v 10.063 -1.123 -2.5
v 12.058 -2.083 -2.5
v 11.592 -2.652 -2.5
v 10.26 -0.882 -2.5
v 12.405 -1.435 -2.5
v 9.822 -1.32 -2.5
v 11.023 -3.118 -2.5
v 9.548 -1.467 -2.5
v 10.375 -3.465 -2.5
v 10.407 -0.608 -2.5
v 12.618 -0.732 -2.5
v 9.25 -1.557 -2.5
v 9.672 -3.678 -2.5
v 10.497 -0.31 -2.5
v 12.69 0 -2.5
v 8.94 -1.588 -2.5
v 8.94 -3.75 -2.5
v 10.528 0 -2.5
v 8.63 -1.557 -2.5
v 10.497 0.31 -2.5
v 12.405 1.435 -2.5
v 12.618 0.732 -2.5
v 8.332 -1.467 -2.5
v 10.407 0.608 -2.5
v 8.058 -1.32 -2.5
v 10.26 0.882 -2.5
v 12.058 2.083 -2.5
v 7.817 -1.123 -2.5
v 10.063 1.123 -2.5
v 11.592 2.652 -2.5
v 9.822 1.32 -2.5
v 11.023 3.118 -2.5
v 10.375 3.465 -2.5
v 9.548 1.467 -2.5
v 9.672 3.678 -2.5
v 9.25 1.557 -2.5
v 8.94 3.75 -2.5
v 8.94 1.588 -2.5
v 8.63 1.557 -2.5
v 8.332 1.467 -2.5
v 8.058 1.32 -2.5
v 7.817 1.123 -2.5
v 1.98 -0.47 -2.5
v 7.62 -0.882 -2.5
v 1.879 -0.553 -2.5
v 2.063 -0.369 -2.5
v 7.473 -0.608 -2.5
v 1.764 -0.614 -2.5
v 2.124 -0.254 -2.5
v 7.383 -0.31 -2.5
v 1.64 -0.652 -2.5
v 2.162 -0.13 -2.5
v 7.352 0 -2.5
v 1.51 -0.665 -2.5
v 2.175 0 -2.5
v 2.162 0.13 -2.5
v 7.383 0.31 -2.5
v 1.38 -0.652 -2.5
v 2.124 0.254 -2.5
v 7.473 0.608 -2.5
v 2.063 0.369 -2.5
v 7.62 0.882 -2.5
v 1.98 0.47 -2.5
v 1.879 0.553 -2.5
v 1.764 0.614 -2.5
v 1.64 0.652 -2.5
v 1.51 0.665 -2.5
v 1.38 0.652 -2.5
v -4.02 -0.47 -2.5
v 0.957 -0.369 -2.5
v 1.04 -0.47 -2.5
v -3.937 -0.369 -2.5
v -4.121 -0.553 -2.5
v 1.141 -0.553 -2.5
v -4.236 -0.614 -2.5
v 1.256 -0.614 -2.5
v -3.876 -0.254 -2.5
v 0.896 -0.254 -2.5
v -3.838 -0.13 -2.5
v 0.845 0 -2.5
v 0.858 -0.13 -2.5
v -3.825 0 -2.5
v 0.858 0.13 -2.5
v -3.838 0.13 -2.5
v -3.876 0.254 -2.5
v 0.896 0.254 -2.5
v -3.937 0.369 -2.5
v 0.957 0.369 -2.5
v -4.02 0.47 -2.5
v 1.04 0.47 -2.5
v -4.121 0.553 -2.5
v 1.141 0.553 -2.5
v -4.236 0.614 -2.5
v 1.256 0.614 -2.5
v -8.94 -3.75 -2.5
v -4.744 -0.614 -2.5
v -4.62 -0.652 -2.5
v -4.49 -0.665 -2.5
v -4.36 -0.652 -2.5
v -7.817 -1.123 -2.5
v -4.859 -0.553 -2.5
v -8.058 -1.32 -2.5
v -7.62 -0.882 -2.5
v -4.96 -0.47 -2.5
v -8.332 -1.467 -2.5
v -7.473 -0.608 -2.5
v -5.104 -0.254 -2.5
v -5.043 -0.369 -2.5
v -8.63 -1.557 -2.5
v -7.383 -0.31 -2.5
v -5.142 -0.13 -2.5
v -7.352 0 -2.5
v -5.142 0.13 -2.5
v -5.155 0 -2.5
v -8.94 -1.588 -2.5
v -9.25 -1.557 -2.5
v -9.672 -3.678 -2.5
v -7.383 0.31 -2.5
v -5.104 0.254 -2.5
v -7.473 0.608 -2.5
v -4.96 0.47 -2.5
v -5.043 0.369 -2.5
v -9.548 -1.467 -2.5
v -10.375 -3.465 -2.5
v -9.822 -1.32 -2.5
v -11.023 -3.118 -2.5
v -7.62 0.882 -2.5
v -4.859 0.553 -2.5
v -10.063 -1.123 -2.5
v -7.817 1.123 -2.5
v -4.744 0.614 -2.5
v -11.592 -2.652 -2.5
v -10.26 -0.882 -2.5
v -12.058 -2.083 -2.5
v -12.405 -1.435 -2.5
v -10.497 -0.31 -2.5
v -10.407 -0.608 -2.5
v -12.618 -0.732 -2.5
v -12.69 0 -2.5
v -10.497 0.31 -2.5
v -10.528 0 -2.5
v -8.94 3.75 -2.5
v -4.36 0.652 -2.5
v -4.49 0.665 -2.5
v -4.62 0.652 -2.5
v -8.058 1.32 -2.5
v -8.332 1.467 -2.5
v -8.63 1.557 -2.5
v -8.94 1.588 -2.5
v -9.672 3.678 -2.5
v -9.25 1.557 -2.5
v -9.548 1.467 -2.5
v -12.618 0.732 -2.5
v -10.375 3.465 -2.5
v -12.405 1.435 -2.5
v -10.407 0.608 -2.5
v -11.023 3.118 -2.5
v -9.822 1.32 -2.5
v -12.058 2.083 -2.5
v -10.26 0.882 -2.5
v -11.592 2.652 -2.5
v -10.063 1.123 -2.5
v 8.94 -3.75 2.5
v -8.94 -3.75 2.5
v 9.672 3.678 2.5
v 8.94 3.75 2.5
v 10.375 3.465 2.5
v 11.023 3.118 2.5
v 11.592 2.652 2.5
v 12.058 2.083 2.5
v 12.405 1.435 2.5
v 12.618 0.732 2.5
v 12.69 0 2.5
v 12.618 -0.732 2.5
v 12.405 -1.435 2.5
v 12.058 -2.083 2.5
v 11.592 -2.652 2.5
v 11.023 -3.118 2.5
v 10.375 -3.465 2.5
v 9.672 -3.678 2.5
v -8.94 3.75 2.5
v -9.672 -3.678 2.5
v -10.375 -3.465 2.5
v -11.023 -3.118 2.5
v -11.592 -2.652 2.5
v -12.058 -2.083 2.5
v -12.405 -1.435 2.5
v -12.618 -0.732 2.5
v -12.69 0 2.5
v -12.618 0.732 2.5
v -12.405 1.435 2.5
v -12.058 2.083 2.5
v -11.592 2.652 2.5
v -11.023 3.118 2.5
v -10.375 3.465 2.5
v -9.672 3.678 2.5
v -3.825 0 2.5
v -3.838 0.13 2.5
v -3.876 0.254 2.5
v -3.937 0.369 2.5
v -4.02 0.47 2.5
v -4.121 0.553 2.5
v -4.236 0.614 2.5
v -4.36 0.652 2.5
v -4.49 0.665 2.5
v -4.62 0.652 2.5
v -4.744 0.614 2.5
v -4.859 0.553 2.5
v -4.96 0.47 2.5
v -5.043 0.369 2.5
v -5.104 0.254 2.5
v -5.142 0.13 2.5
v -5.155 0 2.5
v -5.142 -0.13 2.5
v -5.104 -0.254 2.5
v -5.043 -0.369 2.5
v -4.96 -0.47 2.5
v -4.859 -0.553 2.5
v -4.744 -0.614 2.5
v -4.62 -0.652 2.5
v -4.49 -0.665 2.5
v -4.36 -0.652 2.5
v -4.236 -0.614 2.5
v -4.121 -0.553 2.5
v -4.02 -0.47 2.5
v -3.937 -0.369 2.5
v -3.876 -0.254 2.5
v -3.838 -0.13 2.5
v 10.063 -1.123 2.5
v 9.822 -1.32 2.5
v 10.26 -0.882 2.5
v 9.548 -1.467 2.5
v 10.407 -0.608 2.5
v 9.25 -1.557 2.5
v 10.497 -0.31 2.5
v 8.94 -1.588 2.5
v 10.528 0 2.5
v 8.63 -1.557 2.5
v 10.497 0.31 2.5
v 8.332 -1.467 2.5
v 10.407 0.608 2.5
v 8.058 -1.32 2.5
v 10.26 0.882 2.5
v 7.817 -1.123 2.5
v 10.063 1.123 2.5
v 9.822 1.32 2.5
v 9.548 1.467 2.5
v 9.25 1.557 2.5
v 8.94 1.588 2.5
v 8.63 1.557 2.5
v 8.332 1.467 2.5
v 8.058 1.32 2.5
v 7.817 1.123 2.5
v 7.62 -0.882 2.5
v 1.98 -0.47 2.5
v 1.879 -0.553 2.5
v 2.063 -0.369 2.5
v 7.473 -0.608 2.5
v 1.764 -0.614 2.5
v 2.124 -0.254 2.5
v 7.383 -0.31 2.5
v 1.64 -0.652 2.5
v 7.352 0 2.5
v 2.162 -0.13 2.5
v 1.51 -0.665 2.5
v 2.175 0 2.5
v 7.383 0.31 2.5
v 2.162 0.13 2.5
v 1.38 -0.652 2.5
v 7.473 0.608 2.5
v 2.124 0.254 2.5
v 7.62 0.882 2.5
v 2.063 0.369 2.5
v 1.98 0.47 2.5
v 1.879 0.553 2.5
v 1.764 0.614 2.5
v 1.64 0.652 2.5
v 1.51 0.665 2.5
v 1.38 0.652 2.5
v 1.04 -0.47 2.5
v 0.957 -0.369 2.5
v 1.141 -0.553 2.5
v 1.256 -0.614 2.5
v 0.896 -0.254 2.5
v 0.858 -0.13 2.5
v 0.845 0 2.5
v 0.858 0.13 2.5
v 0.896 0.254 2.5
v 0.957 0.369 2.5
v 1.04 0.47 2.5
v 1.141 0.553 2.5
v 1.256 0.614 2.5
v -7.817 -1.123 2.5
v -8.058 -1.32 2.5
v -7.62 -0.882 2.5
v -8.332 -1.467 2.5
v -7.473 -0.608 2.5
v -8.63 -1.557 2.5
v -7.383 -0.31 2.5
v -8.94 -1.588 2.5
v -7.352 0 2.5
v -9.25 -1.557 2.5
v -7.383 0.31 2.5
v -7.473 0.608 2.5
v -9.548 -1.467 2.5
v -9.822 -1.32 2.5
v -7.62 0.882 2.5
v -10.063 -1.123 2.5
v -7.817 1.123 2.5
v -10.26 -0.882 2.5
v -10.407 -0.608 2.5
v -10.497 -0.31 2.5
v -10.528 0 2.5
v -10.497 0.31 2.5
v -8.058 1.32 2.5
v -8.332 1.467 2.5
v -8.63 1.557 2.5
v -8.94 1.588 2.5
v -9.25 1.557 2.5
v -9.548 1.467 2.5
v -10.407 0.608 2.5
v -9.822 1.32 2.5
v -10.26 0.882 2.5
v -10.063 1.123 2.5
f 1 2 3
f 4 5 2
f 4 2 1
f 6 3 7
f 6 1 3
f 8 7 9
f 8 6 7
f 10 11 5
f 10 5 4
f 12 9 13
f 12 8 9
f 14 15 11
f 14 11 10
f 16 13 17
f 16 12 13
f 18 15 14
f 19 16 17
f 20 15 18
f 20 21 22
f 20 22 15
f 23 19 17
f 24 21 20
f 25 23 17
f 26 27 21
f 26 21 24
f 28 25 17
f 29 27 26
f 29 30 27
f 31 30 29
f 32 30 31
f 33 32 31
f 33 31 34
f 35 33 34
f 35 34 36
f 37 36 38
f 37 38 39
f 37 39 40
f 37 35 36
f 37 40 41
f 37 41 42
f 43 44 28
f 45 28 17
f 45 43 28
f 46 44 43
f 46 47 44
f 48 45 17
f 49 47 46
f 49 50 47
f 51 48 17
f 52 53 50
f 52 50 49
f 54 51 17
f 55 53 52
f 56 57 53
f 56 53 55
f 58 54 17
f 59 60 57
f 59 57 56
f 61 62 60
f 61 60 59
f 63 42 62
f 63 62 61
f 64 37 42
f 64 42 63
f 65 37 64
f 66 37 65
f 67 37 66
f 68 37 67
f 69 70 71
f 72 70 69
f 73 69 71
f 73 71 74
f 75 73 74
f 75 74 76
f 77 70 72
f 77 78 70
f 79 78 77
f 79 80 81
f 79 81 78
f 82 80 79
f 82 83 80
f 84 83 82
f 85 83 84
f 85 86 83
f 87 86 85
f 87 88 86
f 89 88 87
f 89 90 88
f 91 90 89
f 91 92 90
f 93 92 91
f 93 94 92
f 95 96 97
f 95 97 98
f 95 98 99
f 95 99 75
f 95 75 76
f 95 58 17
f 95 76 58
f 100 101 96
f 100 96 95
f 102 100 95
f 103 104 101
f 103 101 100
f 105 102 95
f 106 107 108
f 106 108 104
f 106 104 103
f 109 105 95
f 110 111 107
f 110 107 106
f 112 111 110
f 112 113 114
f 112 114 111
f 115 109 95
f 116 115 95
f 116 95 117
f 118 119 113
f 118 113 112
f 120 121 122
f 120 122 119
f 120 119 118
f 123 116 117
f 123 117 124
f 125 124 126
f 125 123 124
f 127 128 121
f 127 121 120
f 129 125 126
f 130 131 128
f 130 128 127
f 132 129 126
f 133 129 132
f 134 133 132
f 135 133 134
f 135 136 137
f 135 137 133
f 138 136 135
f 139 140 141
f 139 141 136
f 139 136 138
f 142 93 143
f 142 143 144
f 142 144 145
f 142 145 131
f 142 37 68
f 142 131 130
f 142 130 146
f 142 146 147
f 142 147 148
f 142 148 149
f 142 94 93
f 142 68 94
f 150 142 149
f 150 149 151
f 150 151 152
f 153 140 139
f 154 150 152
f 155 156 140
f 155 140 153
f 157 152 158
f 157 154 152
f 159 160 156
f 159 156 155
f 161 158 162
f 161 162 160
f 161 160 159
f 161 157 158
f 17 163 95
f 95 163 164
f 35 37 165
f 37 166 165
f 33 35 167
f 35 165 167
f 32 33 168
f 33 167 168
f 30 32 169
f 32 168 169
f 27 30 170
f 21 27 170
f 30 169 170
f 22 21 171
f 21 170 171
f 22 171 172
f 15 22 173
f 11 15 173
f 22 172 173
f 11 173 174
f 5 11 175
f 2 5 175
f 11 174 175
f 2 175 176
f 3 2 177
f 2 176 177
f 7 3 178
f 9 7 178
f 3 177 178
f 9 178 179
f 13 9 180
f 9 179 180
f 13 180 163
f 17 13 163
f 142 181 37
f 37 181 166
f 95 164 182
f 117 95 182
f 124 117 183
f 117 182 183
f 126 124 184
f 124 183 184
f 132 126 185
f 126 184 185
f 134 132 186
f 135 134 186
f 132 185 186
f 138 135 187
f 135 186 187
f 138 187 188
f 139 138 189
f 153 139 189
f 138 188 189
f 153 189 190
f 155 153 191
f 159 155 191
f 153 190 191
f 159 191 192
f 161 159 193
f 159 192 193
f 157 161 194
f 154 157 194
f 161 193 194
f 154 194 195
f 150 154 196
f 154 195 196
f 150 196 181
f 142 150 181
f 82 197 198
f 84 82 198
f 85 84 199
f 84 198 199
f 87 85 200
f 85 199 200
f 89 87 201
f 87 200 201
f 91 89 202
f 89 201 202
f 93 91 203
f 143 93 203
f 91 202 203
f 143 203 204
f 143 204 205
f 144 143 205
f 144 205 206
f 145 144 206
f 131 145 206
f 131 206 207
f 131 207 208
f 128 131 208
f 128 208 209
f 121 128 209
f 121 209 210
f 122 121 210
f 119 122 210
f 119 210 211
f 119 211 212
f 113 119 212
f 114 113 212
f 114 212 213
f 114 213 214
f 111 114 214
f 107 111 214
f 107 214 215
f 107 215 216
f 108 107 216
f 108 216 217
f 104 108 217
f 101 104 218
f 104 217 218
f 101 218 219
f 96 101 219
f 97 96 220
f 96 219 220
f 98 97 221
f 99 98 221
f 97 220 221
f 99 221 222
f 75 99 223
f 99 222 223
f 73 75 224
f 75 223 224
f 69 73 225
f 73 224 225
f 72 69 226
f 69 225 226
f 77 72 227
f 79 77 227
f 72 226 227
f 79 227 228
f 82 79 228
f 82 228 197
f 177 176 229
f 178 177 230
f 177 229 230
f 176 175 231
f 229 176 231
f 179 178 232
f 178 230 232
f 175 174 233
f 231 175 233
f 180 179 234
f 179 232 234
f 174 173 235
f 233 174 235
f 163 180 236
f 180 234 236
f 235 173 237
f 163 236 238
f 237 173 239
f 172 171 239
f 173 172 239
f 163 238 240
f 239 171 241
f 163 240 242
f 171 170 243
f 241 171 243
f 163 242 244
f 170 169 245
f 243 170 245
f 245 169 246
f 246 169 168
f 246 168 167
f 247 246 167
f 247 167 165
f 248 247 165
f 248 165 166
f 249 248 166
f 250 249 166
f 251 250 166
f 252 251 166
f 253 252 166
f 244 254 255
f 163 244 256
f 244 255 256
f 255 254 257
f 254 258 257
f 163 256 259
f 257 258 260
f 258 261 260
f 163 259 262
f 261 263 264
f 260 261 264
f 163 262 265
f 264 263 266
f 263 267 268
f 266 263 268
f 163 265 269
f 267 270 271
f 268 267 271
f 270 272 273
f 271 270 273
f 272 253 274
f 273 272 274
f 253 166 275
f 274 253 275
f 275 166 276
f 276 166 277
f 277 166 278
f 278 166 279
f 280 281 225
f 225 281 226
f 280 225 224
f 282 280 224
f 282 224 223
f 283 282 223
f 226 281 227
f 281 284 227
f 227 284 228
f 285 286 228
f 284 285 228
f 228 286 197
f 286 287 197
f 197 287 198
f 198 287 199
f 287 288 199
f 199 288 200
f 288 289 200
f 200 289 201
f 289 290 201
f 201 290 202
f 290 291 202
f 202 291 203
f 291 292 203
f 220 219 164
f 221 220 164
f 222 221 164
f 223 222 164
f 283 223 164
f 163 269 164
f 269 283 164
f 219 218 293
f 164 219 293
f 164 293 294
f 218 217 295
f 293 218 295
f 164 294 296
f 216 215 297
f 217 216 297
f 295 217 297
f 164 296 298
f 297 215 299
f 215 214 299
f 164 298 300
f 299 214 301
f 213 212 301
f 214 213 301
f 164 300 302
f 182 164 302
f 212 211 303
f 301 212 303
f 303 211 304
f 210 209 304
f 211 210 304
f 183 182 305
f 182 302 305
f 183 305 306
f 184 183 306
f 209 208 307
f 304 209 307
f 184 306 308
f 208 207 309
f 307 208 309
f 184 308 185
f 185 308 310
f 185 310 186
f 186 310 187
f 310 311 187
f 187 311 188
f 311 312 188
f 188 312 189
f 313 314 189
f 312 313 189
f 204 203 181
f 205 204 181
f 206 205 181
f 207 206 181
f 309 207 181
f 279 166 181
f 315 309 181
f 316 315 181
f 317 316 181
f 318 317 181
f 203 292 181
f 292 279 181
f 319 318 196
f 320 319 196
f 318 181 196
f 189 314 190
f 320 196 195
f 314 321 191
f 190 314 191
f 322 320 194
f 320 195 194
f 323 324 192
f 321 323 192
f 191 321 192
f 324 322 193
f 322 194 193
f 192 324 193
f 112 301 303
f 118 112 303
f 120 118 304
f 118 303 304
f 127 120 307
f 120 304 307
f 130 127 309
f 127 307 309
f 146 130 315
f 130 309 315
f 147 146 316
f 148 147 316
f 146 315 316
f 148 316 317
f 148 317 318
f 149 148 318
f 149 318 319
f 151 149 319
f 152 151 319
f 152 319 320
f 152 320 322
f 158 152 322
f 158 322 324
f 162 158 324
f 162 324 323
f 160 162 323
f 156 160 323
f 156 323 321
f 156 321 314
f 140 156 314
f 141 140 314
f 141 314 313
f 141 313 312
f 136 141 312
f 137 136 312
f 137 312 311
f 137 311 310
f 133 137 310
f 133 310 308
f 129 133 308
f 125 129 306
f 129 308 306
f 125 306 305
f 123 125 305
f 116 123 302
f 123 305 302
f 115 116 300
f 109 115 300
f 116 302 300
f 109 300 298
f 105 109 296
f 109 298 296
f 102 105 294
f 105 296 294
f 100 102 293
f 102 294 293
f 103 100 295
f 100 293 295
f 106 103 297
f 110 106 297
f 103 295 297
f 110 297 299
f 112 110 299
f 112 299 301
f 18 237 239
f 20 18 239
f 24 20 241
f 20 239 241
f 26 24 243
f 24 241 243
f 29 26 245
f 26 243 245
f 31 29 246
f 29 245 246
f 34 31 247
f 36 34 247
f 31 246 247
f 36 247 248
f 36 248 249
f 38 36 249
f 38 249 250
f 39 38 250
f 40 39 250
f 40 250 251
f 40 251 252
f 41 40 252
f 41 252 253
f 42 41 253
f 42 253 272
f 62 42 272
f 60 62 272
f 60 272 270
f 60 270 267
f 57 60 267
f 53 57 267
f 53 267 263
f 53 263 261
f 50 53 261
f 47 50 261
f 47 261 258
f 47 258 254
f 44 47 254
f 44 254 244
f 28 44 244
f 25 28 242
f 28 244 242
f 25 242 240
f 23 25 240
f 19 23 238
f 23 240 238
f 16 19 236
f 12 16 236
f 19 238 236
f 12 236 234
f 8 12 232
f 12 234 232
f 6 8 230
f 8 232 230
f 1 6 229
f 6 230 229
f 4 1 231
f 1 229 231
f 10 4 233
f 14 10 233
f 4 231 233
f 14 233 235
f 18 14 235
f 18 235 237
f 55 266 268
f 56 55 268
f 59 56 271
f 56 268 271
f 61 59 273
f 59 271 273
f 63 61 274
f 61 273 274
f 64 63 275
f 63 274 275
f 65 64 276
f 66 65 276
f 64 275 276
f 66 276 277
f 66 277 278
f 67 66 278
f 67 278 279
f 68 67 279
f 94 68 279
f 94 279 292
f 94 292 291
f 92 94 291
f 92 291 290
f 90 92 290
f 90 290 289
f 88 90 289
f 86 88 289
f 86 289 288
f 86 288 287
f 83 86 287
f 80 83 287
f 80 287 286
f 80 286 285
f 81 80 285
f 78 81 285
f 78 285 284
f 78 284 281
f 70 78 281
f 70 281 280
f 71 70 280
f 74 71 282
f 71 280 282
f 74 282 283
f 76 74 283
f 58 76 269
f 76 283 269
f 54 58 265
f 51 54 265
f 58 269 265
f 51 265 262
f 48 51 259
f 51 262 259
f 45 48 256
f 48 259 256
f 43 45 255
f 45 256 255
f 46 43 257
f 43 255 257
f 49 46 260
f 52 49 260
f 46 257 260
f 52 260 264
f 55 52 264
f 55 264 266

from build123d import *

# Parameters (mm, degrees)
BOSS_EXTRUDE1_DEPTH = 2.5
SKETCH2_R           = 1.5875
CUT_EXTRUDE1_DEPTH  = 15.145621231
CUT_EXTRUDE2_REACH  = 16.146
SKETCH5_R           = 0.665


with BuildPart() as part:
    # Sketch1 → Boss-Extrude1 (new, symmetric)
    with BuildSketch(Plane.XY):
        with BuildLine():
            Line((-8.94, 3.75), (8.94, 3.75))
            ThreePointArc((8.94, 3.75), (12.69, 0), (8.94, -3.75))
            Line((8.94, -3.75), (-8.94, -3.75))
            ThreePointArc((-8.94, -3.75), (-12.69, 0), (-8.94, 3.75))
        make_face()
    extrude(amount=BOSS_EXTRUDE1_DEPTH, both=True)

    # Sketch2 → Cut-Extrude1 (cut, through all)
    with BuildSketch(Plane.XY.offset(2.5)):
        with Locations((-8.94, 0)):
            Circle(SKETCH2_R)
        with Locations((8.94, 0)):
            Circle(SKETCH2_R)
    extrude(amount=-CUT_EXTRUDE1_DEPTH, mode=Mode.SUBTRACT)

    # Sketch5 → Cut-Extrude2 (cut, up to next)
    with BuildSketch(Plane.XY.offset(2.5), mode=Mode.PRIVATE) as cut_extrude2_sk1:
        with Locations((-4.49, 0)):
            Circle(SKETCH5_R)
    cut_extrude2_tool1 = extrude(cut_extrude2_sk1.sketch, amount=-CUT_EXTRUDE2_REACH, mode=Mode.PRIVATE) & part.part
    # Sketch5 → Cut-Extrude2 (cut, up to next)
    with BuildSketch(Plane.XY.offset(2.5), mode=Mode.PRIVATE) as cut_extrude2_sk2:
        with Locations((1.51, 0)):
            Circle(SKETCH5_R)
    cut_extrude2_tool2 = extrude(cut_extrude2_sk2.sketch, amount=-CUT_EXTRUDE2_REACH, mode=Mode.PRIVATE) & part.part
    add(cut_extrude2_tool1.solids().sort_by_distance((-4.49, 0, 2.5))[0], mode=Mode.SUBTRACT)
    add(cut_extrude2_tool2.solids().sort_by_distance((1.51, 0, 2.5))[0], mode=Mode.SUBTRACT)


solid = part.part
